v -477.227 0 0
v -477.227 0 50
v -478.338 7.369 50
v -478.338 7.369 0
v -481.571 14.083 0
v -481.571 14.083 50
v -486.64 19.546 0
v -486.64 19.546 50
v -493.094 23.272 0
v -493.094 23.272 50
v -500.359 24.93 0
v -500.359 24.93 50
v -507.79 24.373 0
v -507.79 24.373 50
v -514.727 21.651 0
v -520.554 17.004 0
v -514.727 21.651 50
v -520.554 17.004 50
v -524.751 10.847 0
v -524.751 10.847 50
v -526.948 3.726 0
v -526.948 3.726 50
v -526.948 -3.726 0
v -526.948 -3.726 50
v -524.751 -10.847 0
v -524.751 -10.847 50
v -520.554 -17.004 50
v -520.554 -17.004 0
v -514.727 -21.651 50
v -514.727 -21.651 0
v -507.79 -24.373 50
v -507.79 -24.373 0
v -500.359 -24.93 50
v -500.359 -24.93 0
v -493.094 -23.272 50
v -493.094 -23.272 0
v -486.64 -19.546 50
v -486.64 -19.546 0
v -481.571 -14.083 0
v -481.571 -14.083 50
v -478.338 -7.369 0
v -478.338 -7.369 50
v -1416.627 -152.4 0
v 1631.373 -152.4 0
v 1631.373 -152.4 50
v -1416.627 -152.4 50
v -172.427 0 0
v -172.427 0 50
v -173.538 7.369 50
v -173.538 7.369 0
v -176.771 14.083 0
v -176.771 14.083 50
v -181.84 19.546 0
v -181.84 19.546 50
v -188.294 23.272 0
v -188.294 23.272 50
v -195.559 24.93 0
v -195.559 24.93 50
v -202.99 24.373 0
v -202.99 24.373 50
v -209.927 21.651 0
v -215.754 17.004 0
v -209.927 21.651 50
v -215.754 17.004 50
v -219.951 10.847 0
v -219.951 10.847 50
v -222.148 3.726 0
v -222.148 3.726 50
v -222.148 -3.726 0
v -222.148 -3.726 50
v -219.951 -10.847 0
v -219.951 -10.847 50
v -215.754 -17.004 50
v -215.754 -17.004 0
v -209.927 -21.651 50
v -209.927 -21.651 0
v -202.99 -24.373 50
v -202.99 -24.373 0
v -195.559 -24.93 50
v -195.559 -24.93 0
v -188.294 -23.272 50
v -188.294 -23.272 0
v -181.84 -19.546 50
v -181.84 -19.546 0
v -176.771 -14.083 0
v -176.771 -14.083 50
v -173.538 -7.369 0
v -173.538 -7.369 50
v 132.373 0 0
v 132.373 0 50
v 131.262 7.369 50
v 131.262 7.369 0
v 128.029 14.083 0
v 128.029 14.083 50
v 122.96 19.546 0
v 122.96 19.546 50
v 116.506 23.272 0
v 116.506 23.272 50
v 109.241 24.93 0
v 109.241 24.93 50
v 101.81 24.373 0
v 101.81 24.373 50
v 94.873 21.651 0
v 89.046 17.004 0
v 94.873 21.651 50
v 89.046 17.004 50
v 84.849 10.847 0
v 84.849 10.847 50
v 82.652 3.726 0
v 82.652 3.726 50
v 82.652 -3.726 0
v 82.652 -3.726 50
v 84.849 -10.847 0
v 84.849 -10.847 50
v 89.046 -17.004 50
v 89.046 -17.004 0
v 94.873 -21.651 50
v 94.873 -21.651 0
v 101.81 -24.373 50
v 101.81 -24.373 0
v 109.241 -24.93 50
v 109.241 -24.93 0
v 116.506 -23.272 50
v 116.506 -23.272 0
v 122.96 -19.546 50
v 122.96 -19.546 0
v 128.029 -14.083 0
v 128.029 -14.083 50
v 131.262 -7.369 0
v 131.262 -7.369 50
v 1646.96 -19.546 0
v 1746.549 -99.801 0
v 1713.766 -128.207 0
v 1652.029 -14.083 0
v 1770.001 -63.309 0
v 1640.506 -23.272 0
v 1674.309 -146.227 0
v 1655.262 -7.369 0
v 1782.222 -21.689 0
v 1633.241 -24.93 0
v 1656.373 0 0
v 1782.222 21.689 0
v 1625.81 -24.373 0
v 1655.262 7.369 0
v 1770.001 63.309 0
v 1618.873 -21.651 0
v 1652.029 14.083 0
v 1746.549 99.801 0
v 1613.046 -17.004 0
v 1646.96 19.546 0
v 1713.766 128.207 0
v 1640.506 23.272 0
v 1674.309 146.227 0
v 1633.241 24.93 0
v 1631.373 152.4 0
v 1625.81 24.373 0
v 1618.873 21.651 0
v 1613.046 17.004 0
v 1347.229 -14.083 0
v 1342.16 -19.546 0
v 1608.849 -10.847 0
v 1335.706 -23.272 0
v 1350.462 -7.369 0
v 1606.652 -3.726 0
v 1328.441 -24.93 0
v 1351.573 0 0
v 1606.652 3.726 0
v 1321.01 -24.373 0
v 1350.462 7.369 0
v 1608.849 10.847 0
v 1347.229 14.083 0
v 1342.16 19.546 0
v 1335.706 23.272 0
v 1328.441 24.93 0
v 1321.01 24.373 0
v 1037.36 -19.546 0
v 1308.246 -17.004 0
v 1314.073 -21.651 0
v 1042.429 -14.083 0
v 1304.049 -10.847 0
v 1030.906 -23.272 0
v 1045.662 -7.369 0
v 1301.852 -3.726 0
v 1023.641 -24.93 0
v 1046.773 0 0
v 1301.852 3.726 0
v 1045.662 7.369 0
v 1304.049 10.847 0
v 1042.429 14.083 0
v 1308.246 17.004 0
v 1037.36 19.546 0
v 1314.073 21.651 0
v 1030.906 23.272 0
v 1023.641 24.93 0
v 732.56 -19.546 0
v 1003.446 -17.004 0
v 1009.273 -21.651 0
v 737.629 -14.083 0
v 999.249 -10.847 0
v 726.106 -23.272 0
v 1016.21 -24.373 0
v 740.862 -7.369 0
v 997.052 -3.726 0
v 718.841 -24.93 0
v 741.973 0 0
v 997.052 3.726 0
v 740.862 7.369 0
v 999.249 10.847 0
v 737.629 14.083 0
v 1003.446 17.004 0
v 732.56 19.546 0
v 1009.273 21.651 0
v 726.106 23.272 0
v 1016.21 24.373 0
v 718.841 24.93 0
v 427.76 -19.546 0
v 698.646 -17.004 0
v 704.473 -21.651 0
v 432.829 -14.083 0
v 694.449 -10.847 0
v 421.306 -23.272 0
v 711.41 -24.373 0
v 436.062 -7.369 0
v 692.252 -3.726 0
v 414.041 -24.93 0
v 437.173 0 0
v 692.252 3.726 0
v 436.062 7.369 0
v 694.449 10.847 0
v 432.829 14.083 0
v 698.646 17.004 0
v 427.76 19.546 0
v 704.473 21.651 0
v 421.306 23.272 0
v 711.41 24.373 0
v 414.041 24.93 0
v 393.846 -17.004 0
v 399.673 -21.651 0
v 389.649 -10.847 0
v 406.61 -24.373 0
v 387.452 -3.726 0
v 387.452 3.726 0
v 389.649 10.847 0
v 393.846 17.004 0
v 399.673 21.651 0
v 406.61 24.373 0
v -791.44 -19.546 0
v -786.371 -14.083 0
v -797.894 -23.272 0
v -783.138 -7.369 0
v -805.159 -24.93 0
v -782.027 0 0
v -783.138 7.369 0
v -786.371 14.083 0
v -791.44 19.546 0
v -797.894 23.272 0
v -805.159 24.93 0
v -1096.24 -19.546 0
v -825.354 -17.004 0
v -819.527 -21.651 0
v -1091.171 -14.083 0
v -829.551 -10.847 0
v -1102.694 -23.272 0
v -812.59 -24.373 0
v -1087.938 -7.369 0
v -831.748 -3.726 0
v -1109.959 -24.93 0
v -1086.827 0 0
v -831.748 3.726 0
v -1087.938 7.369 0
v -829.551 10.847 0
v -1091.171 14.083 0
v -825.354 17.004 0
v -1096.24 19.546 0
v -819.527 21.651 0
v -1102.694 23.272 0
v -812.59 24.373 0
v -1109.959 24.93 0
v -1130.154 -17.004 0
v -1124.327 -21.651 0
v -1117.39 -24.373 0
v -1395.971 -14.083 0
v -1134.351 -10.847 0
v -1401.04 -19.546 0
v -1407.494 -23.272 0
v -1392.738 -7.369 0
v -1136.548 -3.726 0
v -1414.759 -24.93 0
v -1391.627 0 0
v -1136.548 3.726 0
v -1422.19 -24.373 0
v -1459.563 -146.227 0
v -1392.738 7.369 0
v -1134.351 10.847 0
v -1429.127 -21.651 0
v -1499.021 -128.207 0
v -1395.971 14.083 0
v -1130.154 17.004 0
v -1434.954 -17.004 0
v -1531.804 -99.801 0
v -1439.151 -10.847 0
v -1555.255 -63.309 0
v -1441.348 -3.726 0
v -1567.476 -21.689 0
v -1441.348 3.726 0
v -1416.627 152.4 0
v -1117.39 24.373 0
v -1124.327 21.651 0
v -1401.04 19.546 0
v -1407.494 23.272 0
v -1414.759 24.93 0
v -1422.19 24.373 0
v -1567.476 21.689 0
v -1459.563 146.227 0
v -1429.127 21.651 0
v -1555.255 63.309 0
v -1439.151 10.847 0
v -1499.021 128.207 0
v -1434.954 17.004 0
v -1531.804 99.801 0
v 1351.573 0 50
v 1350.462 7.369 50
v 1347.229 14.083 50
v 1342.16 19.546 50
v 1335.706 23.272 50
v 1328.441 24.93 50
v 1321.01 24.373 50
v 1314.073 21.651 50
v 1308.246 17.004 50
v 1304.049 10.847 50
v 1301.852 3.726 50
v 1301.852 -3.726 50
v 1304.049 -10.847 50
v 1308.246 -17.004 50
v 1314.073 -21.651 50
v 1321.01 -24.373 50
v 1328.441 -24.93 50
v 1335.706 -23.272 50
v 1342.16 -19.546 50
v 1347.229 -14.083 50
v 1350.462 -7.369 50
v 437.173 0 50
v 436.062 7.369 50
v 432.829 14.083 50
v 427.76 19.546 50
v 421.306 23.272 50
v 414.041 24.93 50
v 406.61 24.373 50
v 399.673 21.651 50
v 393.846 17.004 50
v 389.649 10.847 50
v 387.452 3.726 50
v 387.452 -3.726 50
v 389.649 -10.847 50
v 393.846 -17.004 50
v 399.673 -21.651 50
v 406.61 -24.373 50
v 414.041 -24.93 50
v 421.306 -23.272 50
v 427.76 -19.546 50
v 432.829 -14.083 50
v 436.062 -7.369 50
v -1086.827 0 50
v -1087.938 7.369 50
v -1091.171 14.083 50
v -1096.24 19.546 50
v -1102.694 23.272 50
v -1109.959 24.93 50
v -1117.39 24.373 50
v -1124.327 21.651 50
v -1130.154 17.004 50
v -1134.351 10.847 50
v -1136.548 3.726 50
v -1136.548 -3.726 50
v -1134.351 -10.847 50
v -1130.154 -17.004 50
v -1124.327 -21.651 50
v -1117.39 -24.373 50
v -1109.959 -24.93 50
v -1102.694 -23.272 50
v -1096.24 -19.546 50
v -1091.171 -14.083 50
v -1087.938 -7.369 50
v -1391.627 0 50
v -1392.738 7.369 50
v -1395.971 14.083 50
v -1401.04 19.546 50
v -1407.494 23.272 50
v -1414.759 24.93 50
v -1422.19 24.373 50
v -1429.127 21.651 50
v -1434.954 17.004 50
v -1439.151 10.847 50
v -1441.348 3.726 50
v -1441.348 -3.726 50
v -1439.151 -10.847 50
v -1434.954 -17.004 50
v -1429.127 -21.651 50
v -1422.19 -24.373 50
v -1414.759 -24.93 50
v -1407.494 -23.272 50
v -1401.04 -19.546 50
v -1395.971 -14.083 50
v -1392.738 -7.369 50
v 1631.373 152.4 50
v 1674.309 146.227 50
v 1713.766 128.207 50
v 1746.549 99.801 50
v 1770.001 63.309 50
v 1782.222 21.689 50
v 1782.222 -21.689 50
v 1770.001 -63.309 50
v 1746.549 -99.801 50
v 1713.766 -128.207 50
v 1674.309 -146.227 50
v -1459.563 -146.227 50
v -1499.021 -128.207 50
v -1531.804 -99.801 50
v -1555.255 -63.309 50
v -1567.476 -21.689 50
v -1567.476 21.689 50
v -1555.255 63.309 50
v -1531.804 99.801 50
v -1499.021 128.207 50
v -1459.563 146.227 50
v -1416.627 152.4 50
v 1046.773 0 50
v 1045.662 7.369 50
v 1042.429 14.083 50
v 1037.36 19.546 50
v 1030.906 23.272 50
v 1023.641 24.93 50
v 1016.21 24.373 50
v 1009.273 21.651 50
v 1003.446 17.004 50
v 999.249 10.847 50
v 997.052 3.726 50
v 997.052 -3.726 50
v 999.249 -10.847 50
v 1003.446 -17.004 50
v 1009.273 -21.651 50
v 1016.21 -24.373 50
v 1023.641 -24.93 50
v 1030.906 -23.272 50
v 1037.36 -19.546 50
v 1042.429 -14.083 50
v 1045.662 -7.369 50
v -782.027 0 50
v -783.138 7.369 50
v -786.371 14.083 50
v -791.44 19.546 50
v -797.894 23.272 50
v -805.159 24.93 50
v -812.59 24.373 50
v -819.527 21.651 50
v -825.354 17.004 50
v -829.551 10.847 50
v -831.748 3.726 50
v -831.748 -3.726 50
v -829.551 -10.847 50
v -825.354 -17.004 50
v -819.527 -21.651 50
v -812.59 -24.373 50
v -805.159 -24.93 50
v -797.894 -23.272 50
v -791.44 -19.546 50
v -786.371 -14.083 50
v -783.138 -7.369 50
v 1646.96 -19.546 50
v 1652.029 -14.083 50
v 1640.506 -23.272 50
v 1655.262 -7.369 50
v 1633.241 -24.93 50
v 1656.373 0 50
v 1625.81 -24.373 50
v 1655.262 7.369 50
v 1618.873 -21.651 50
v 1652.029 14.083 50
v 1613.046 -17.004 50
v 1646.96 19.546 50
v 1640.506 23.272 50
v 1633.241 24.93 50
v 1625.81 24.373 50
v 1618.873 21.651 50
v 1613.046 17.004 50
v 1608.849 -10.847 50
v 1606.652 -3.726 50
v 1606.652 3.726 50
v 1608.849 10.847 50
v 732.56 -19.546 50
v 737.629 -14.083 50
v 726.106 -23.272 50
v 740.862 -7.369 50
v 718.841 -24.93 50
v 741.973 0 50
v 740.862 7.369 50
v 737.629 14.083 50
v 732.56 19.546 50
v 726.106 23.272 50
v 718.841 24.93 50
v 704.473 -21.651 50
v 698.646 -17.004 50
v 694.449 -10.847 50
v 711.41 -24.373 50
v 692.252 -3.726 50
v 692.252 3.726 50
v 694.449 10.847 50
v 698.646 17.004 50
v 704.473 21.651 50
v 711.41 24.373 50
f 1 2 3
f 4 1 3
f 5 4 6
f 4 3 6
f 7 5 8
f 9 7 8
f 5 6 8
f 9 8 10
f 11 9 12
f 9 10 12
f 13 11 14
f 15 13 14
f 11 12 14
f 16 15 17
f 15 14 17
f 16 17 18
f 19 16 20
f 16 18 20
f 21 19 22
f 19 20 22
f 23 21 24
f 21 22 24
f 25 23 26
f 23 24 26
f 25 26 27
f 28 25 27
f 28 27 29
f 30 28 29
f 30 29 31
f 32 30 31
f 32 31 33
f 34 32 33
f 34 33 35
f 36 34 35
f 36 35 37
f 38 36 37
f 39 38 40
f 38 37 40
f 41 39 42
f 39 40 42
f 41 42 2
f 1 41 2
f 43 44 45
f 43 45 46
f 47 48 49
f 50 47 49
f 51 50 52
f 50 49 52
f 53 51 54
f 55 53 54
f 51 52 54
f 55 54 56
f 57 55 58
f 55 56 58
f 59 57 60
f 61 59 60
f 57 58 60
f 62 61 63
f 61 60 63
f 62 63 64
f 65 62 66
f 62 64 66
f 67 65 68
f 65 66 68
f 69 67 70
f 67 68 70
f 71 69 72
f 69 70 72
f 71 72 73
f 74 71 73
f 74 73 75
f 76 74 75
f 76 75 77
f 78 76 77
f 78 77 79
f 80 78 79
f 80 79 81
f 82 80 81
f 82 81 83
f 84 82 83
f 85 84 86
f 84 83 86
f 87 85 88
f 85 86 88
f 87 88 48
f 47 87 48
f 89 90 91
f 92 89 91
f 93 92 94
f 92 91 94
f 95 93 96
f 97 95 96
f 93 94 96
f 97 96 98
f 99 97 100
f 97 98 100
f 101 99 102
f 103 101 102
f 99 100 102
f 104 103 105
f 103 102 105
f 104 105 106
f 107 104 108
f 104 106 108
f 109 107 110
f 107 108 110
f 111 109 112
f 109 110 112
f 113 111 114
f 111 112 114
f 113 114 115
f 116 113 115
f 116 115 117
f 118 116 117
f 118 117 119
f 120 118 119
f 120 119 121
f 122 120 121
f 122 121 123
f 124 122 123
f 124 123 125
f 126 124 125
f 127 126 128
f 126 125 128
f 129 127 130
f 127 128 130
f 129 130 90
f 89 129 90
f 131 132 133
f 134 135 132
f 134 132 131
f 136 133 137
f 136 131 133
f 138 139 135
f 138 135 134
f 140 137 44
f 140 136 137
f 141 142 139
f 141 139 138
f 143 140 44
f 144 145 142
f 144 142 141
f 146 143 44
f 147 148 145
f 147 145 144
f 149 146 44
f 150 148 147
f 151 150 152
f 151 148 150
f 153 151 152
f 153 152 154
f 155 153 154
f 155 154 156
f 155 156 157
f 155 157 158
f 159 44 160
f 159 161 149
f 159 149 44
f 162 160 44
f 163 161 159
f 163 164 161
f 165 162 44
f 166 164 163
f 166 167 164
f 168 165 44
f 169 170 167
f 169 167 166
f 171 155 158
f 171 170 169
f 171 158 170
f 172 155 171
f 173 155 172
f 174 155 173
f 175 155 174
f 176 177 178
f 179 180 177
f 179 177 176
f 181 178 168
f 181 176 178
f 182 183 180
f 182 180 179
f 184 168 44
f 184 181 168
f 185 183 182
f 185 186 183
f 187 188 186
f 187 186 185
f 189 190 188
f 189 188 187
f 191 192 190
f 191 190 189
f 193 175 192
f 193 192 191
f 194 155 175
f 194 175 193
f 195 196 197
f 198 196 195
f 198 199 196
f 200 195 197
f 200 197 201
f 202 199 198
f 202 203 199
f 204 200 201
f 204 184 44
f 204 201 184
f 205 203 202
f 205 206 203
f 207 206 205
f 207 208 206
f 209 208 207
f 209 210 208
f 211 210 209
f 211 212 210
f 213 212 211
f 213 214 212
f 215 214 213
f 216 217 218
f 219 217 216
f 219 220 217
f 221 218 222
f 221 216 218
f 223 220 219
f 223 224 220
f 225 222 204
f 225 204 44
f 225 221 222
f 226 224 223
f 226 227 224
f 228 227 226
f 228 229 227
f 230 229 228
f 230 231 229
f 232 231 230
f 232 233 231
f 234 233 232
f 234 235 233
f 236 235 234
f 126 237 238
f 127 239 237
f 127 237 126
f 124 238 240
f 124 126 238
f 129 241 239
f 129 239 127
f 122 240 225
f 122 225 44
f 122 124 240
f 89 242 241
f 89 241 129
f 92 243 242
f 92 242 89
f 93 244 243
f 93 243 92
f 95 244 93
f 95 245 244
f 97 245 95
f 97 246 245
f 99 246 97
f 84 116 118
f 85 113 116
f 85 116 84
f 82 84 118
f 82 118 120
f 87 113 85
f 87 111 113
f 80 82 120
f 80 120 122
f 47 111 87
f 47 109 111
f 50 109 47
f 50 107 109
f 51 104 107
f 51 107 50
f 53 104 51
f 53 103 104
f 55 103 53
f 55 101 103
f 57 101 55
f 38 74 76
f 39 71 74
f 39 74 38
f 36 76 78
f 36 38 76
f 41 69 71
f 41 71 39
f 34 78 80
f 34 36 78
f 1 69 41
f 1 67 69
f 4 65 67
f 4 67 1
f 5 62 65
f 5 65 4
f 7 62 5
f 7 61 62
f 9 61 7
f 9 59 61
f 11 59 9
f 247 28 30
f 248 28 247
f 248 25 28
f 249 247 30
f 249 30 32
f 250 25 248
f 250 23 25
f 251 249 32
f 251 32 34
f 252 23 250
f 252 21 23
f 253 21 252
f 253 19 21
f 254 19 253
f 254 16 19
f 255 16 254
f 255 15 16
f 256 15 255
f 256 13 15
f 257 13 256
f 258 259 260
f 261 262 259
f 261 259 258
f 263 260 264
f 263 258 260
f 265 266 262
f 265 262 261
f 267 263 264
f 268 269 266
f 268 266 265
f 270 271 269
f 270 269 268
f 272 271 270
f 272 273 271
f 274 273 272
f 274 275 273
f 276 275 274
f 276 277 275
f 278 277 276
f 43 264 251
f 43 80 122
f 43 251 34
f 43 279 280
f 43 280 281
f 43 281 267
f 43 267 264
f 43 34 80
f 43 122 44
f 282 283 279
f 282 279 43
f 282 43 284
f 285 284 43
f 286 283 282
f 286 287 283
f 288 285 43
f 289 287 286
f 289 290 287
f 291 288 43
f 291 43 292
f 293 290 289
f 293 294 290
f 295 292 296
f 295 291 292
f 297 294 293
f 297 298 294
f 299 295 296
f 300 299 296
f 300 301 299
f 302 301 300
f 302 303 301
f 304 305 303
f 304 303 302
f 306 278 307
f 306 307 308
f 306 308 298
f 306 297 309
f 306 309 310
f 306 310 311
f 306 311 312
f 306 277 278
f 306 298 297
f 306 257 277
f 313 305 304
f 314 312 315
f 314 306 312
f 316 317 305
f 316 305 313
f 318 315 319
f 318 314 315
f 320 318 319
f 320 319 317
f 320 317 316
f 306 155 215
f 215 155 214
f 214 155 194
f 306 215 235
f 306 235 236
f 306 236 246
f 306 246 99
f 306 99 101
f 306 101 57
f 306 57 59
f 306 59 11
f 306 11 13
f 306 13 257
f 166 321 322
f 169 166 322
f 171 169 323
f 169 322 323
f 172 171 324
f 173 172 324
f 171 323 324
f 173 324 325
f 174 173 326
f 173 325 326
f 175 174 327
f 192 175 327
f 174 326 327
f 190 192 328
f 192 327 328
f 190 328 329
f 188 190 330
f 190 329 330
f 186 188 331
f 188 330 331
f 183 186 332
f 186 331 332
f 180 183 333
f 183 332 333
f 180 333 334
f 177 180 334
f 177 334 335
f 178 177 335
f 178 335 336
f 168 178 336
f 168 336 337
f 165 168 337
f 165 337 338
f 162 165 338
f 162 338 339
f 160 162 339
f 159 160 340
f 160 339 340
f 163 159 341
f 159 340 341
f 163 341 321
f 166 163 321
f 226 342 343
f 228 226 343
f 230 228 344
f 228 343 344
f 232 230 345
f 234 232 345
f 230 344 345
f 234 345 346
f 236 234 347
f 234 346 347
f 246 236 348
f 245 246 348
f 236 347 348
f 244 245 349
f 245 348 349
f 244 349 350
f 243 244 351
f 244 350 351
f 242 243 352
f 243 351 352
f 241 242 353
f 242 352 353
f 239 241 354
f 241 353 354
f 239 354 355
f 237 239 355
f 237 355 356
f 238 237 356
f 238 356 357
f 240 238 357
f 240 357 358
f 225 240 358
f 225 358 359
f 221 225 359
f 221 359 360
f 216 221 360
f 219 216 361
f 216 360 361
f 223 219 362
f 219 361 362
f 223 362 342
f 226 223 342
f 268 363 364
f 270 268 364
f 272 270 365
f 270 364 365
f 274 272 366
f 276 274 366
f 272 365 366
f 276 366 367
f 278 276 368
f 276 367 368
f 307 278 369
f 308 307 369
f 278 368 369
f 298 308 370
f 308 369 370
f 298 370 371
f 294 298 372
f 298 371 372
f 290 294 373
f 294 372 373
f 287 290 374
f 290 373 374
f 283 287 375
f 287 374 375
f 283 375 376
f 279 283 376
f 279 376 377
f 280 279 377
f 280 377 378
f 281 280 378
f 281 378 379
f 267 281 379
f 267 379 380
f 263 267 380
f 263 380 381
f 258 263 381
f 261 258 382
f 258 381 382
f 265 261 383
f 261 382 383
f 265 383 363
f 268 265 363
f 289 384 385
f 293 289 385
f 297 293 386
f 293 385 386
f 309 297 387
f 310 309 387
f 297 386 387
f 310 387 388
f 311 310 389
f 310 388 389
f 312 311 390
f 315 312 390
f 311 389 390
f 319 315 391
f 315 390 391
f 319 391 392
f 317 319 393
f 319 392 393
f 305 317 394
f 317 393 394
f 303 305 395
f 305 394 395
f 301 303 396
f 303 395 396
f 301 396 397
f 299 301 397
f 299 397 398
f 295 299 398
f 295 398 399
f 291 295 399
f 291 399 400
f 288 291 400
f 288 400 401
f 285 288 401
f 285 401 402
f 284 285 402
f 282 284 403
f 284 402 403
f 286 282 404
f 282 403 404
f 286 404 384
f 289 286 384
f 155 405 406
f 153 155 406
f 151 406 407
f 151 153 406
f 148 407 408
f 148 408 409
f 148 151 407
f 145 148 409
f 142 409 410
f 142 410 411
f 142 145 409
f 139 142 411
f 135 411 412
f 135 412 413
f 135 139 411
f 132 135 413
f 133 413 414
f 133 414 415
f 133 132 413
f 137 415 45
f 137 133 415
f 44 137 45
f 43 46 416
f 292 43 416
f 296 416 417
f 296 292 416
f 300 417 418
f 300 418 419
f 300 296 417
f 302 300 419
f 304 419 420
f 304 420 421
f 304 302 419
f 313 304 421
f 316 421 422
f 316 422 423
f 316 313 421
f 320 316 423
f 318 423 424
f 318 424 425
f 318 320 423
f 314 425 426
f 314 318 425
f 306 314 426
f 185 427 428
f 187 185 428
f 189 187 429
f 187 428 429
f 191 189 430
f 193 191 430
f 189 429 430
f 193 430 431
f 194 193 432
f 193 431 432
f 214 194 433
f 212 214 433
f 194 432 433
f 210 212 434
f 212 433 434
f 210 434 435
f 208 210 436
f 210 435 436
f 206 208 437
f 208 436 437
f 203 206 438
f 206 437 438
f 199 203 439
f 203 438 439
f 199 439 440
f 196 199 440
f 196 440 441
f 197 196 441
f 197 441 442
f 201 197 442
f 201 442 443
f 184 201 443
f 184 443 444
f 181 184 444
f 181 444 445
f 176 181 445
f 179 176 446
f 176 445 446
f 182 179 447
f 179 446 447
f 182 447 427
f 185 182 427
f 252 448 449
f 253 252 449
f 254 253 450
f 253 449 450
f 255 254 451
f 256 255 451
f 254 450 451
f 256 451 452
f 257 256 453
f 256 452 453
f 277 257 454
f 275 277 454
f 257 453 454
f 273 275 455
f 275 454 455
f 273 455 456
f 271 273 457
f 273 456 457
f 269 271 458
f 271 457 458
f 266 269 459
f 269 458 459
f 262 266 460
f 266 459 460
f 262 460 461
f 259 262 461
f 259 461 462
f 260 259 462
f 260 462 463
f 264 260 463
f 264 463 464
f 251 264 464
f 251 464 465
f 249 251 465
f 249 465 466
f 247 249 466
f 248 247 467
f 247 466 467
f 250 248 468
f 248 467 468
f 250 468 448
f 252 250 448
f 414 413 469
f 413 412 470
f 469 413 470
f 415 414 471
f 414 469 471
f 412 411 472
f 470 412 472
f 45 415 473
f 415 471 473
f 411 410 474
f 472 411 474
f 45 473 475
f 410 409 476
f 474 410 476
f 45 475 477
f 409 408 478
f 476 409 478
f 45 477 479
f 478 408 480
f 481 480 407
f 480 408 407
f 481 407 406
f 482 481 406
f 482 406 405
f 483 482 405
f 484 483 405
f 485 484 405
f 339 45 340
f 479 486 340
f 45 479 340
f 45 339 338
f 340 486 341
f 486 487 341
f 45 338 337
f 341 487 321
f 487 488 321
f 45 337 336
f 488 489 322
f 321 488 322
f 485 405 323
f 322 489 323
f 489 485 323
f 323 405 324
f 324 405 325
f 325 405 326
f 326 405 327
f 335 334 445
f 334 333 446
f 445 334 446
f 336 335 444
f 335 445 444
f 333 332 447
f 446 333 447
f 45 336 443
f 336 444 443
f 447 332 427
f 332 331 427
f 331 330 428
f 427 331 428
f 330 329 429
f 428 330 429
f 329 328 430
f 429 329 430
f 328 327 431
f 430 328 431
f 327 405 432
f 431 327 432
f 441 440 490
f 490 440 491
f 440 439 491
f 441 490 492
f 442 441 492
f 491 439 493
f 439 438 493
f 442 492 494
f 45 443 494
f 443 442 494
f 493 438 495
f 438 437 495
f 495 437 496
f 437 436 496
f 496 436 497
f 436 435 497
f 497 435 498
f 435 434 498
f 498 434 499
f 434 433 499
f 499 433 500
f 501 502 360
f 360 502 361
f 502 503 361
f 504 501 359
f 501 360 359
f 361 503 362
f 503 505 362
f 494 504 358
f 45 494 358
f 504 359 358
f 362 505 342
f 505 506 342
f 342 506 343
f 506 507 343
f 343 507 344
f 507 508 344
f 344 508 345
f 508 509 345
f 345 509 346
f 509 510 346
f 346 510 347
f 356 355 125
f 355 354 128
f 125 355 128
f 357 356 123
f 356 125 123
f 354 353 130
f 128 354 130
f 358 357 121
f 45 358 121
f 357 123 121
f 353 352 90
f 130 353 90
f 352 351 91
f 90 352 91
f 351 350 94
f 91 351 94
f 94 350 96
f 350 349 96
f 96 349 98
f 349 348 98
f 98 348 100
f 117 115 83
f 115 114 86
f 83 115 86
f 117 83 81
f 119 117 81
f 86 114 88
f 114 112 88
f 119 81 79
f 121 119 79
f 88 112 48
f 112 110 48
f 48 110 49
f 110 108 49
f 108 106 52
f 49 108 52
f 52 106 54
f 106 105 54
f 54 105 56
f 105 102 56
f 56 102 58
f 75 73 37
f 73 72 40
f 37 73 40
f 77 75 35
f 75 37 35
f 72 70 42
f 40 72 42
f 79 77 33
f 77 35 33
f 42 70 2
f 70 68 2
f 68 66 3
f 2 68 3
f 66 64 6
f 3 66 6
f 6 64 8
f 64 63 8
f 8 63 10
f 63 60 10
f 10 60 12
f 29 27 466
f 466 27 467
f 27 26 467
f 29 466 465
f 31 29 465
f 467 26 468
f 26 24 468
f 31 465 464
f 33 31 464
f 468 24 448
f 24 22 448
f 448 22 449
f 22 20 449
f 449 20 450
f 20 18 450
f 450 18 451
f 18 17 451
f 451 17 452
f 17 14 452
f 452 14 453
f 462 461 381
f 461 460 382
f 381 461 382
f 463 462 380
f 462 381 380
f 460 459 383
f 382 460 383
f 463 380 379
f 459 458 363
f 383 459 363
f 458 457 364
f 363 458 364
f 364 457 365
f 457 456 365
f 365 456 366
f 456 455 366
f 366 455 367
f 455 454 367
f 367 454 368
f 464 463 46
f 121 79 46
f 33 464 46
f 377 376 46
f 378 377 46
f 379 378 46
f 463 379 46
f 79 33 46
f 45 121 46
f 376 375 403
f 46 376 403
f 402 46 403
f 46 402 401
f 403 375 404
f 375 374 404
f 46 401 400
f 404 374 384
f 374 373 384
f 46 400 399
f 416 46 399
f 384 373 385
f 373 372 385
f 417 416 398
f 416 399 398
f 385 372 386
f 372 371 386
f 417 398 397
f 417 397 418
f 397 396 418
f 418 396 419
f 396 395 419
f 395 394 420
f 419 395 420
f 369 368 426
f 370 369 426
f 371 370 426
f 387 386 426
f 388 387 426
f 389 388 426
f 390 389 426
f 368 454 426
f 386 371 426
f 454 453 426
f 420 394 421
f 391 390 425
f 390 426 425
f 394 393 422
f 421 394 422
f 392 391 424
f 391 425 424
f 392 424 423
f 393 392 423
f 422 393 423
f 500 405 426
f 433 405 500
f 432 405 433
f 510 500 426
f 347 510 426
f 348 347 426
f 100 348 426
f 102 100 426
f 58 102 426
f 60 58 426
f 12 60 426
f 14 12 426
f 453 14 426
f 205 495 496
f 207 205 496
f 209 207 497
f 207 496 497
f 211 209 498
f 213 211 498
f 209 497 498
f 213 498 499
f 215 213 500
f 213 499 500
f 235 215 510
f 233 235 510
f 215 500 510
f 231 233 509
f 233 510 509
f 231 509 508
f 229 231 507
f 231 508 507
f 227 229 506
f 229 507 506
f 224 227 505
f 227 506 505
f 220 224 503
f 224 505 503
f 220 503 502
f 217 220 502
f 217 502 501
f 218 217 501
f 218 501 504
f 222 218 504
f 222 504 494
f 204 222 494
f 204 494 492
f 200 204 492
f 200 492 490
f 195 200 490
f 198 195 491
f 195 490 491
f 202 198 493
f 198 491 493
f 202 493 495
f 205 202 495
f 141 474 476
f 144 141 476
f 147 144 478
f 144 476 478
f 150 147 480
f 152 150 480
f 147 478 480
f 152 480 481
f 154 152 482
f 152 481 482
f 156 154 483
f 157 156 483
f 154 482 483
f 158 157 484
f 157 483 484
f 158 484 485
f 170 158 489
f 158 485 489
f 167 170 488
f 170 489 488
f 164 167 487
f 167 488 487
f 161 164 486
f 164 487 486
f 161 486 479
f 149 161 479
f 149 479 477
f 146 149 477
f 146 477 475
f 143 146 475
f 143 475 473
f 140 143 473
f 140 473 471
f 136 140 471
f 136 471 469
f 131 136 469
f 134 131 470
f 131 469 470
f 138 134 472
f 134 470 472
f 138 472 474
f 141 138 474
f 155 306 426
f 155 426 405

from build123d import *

# Parameters (mm, degrees)
BOSS_EXTRUDE1_DEPTH = 50
SKETCH2_R           = 25
CUT_EXTRUDE1_DEPTH  = 50
LPATTERN1_COUNT     = 11
LPATTERN1_PITCH     = 304.8


with BuildPart() as part:
    # Sketch1 → Boss-Extrude1 (new body)
    with BuildSketch(Plane.XY):
        with BuildLine():
            Line((-1416.627272727, 152.4), (1631.372727273, 152.4))
            ThreePointArc((1631.372727273, 152.4), (1783.772727273, 0), (1631.372727273, -152.4))
            Line((1631.372727273, -152.4), (-1416.627272727, -152.4))
            ThreePointArc((-1416.627272727, -152.4), (-1569.027272727, 0), (-1416.627272727, 152.4))
        make_face()
    extrude(amount=BOSS_EXTRUDE1_DEPTH)

    # Sketch2 → Cut-Extrude1 (cut)
    with BuildSketch(Plane.XY.offset(50)):
        with Locations((1631.372727273, 0)):
            Circle(SKETCH2_R)
    cut_extrude1 = extrude(amount=-CUT_EXTRUDE1_DEPTH, mode=Mode.SUBTRACT)

    # LPattern1: Cut-Extrude1 ×11
    with Locations(*[(-i * LPATTERN1_PITCH, 0, 0) for i in range(1, LPATTERN1_COUNT)]):
        add(cut_extrude1, mode=Mode.SUBTRACT)


solid = part.part
